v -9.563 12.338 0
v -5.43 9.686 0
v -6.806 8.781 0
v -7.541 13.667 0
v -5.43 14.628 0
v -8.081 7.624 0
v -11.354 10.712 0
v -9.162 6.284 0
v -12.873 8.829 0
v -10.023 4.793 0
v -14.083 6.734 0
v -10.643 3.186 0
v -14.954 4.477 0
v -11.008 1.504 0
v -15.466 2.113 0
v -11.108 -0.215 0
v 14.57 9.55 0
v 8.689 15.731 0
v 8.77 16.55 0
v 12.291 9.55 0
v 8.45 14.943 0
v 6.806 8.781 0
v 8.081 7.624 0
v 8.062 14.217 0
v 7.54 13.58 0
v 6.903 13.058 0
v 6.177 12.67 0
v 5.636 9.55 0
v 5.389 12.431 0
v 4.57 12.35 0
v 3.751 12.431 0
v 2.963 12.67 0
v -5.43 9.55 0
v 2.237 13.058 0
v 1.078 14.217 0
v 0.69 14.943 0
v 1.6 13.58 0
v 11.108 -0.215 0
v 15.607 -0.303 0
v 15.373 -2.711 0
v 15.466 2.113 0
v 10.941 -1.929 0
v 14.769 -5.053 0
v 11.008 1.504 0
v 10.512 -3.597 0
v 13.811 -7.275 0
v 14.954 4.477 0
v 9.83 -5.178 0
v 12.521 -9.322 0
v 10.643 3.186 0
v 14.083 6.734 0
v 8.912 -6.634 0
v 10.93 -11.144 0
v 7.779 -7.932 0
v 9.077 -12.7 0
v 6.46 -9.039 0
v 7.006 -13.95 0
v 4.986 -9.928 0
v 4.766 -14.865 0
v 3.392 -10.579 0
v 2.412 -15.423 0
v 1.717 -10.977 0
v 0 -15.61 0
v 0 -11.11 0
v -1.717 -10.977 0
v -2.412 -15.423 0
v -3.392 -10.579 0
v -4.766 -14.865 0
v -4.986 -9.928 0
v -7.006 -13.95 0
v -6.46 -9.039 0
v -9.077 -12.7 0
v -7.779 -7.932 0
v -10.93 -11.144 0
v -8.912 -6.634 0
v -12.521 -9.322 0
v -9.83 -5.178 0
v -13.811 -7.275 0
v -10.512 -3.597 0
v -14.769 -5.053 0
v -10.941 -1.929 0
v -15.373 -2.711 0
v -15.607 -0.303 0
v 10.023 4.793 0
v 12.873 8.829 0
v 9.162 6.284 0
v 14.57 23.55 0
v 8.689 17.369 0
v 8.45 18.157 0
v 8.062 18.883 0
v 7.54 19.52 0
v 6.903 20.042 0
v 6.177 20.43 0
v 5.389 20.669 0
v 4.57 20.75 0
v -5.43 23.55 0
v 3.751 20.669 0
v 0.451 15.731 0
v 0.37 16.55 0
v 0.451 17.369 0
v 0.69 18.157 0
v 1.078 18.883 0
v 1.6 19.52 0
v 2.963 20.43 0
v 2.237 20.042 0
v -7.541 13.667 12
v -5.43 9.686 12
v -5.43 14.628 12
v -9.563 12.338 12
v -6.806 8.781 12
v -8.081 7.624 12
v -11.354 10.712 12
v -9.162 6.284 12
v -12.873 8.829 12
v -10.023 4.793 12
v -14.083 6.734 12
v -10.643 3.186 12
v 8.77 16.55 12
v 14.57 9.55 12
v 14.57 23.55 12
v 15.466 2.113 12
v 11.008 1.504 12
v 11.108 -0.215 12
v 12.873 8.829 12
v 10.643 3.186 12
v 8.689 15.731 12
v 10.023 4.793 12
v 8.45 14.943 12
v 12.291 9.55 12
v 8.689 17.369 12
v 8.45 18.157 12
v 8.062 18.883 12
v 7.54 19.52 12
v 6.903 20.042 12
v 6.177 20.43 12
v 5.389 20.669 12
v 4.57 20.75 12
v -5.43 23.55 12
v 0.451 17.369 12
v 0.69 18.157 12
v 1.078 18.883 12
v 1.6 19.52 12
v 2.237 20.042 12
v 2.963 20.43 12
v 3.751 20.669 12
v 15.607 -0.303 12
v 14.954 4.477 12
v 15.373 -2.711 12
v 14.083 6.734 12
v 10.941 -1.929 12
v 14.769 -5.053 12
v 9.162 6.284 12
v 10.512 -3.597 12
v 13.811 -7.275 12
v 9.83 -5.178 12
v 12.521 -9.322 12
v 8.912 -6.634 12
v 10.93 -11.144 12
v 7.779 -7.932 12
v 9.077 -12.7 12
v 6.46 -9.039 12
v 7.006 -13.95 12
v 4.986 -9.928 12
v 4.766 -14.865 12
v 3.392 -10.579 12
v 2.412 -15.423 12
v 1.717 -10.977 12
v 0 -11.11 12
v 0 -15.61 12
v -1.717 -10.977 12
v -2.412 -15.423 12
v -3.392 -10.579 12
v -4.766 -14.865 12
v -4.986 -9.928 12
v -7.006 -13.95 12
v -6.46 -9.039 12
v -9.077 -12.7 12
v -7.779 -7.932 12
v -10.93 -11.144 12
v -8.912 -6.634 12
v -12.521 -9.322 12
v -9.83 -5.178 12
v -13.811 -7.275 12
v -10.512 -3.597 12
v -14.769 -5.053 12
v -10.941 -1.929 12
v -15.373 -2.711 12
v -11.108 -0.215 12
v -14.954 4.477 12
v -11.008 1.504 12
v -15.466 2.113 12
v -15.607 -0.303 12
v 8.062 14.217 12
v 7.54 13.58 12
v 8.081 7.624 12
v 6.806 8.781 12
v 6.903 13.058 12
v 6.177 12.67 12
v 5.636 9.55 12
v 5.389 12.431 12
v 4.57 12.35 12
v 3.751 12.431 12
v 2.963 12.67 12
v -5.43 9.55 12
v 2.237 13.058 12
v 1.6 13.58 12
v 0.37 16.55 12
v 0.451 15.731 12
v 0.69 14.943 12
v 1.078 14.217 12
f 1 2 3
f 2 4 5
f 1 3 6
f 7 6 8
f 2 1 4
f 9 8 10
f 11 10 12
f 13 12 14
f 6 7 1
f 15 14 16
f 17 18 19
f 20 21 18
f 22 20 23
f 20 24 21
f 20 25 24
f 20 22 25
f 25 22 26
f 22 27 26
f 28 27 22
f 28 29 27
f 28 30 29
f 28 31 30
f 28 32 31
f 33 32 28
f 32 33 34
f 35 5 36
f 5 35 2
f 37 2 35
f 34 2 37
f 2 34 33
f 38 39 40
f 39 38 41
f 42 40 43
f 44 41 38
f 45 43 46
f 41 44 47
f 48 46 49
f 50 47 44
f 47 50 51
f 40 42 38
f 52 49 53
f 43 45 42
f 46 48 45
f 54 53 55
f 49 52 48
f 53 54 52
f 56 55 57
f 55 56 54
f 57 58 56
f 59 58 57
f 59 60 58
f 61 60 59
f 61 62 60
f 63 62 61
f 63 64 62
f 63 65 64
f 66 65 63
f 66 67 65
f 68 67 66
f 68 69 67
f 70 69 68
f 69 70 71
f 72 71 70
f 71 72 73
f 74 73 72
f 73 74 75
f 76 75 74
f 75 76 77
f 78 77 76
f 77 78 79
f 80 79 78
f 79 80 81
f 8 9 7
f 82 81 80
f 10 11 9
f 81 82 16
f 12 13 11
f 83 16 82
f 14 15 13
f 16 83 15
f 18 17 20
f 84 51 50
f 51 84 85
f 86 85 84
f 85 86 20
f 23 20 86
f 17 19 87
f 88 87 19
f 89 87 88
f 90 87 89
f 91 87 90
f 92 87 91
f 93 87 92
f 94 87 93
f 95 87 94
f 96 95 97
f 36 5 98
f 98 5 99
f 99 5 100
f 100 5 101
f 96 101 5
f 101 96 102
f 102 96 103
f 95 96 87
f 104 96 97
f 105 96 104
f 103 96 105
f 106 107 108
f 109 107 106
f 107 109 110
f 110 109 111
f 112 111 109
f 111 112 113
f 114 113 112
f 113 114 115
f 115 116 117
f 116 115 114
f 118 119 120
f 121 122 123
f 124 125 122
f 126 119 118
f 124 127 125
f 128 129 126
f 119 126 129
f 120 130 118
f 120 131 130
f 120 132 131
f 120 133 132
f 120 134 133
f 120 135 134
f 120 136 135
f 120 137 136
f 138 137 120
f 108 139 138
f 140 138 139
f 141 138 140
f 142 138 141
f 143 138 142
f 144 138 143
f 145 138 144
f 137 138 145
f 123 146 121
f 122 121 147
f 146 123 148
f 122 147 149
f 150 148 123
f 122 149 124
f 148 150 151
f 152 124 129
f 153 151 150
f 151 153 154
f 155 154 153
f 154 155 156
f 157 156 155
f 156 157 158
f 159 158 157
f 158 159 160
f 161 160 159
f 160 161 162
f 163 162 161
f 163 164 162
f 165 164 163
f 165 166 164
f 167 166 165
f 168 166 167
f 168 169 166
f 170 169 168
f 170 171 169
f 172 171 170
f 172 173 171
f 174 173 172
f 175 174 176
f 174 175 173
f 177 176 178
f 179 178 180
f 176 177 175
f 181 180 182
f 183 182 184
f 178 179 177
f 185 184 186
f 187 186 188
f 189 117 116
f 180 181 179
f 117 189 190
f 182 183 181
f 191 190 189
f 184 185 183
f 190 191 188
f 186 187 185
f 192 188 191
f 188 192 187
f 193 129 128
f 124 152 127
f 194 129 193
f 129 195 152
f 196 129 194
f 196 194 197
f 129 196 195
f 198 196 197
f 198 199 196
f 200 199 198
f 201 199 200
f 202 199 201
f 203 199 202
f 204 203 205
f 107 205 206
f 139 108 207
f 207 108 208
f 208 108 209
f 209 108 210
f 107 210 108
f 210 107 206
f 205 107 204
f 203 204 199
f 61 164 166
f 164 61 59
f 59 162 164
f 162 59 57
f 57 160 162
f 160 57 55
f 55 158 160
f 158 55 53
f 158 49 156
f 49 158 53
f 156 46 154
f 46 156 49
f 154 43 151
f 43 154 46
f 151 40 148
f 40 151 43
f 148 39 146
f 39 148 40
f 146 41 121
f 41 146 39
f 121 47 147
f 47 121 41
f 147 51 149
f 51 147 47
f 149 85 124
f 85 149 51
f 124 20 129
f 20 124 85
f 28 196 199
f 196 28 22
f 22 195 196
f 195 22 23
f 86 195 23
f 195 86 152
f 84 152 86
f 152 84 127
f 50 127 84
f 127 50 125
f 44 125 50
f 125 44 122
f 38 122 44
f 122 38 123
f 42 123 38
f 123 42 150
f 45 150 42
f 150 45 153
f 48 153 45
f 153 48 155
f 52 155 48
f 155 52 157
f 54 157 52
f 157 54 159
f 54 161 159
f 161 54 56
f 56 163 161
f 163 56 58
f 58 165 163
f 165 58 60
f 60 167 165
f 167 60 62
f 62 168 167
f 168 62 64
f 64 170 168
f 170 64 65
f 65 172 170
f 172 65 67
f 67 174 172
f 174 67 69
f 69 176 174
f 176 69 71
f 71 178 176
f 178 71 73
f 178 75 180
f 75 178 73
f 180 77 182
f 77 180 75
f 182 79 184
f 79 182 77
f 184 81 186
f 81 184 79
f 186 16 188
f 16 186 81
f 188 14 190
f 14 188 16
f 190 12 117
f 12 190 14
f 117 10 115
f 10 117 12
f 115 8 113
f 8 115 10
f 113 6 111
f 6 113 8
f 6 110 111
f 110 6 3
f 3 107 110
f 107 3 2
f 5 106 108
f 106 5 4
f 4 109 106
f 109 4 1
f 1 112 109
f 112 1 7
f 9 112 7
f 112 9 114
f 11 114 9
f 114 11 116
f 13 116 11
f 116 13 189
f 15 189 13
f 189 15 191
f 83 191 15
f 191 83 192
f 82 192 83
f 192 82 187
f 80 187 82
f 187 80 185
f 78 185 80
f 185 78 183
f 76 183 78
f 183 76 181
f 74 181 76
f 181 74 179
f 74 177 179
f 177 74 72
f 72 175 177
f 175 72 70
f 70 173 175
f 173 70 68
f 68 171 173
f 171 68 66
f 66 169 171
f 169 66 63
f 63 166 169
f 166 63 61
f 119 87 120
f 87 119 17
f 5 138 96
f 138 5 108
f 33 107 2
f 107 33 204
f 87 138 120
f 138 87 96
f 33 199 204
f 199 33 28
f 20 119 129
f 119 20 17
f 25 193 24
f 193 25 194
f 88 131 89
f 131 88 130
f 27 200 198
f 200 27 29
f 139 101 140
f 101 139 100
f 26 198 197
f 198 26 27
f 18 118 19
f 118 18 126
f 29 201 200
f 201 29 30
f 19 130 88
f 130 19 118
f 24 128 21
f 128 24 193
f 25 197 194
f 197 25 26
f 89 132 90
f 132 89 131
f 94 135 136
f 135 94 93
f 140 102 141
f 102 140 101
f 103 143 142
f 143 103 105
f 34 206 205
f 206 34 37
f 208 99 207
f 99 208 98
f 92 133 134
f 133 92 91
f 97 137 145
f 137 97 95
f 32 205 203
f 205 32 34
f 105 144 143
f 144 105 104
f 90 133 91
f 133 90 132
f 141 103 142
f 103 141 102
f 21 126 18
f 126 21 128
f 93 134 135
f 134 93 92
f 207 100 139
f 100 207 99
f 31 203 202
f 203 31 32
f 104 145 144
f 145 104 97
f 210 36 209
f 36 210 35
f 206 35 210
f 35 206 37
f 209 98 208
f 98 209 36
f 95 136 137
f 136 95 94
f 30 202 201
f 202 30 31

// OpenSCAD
$fn = 32;

// ----------------------------------------------------------------------
// Pipe clamp: 31.22 mm ring, 4.5 mm wall, 12 mm wide
// ----------------------------------------------------------------------

// --- parameters (mm) ---
outer_r = 15.61;          // clamp outside radius
inner_r = 11.11;          // pipe bore radius
band = 4.5;               // band thickness
clamp_w = 12;             // clamp width
opening = 40;             // opening angle between the ends
lug_w = 20;               // lug width
lug_len = 14;             // lug length
bolt_d = 8.4;             // bolt hole

clamp_profile = [[-5.339, 14.669], [-7.541, 13.667], [-9.563, 12.338], [-11.354, 10.712], [-12.873, 8.829], [-14.083, 6.734], [-14.954, 4.477], [-15.466, 2.113], [-15.607, -0.303], [-15.373, -2.711], [-14.769, -5.053], [-13.811, -7.275], [-12.521, -9.322], [-10.93, -11.144], [-9.077, -12.7], [-7.006, -13.95], [-4.766, -14.865], [-2.412, -15.423], [0, -15.61], [2.412, -15.423], [4.766, -14.865], [7.006, -13.95], [9.077, -12.7], [10.93, -11.144], [12.521, -9.322], [13.811, -7.275], [14.769, -5.053], [15.373, -2.711], [15.607, -0.303], [15.466, 2.113], [14.954, 4.477], [14.083, 6.734], [12.873, 8.829], [11.354, 10.712], [9.563, 12.338], [7.541, 13.667], [5.339, 14.669], [3.8, 10.44], [5.367, 9.727], [6.806, 8.781], [8.081, 7.624], [9.162, 6.284], [10.023, 4.793], [10.643, 3.186], [11.008, 1.504], [11.108, -0.215], [10.941, -1.929], [10.512, -3.597], [9.83, -5.178], [8.912, -6.634], [7.779, -7.932], [6.46, -9.039], [4.986, -9.928], [3.392, -10.579], [1.717, -10.977], [0, -11.11], [-1.717, -10.977], [-3.392, -10.579], [-4.986, -9.928], [-6.46, -9.039], [-7.779, -7.932], [-8.912, -6.634], [-9.83, -5.178], [-10.512, -3.597], [-10.941, -1.929], [-11.108, -0.215], [-11.008, 1.504], [-10.643, 3.186], [-10.023, 4.793], [-9.162, 6.284], [-8.081, 7.624], [-6.806, 8.781], [-5.367, 9.727], [-3.8, 10.44]];

difference() {
  union() {
    linear_extrude(height = clamp_w) polygon(clamp_profile);
    /* bolt lug on the other end */
    translate([-5.43, 9.55, 0]) cube([lug_w, 14, clamp_w]);
  }
  translate([4.57, 16.55, -2.5]) cylinder(h = clamp_w + 5, d = bolt_d);
}
